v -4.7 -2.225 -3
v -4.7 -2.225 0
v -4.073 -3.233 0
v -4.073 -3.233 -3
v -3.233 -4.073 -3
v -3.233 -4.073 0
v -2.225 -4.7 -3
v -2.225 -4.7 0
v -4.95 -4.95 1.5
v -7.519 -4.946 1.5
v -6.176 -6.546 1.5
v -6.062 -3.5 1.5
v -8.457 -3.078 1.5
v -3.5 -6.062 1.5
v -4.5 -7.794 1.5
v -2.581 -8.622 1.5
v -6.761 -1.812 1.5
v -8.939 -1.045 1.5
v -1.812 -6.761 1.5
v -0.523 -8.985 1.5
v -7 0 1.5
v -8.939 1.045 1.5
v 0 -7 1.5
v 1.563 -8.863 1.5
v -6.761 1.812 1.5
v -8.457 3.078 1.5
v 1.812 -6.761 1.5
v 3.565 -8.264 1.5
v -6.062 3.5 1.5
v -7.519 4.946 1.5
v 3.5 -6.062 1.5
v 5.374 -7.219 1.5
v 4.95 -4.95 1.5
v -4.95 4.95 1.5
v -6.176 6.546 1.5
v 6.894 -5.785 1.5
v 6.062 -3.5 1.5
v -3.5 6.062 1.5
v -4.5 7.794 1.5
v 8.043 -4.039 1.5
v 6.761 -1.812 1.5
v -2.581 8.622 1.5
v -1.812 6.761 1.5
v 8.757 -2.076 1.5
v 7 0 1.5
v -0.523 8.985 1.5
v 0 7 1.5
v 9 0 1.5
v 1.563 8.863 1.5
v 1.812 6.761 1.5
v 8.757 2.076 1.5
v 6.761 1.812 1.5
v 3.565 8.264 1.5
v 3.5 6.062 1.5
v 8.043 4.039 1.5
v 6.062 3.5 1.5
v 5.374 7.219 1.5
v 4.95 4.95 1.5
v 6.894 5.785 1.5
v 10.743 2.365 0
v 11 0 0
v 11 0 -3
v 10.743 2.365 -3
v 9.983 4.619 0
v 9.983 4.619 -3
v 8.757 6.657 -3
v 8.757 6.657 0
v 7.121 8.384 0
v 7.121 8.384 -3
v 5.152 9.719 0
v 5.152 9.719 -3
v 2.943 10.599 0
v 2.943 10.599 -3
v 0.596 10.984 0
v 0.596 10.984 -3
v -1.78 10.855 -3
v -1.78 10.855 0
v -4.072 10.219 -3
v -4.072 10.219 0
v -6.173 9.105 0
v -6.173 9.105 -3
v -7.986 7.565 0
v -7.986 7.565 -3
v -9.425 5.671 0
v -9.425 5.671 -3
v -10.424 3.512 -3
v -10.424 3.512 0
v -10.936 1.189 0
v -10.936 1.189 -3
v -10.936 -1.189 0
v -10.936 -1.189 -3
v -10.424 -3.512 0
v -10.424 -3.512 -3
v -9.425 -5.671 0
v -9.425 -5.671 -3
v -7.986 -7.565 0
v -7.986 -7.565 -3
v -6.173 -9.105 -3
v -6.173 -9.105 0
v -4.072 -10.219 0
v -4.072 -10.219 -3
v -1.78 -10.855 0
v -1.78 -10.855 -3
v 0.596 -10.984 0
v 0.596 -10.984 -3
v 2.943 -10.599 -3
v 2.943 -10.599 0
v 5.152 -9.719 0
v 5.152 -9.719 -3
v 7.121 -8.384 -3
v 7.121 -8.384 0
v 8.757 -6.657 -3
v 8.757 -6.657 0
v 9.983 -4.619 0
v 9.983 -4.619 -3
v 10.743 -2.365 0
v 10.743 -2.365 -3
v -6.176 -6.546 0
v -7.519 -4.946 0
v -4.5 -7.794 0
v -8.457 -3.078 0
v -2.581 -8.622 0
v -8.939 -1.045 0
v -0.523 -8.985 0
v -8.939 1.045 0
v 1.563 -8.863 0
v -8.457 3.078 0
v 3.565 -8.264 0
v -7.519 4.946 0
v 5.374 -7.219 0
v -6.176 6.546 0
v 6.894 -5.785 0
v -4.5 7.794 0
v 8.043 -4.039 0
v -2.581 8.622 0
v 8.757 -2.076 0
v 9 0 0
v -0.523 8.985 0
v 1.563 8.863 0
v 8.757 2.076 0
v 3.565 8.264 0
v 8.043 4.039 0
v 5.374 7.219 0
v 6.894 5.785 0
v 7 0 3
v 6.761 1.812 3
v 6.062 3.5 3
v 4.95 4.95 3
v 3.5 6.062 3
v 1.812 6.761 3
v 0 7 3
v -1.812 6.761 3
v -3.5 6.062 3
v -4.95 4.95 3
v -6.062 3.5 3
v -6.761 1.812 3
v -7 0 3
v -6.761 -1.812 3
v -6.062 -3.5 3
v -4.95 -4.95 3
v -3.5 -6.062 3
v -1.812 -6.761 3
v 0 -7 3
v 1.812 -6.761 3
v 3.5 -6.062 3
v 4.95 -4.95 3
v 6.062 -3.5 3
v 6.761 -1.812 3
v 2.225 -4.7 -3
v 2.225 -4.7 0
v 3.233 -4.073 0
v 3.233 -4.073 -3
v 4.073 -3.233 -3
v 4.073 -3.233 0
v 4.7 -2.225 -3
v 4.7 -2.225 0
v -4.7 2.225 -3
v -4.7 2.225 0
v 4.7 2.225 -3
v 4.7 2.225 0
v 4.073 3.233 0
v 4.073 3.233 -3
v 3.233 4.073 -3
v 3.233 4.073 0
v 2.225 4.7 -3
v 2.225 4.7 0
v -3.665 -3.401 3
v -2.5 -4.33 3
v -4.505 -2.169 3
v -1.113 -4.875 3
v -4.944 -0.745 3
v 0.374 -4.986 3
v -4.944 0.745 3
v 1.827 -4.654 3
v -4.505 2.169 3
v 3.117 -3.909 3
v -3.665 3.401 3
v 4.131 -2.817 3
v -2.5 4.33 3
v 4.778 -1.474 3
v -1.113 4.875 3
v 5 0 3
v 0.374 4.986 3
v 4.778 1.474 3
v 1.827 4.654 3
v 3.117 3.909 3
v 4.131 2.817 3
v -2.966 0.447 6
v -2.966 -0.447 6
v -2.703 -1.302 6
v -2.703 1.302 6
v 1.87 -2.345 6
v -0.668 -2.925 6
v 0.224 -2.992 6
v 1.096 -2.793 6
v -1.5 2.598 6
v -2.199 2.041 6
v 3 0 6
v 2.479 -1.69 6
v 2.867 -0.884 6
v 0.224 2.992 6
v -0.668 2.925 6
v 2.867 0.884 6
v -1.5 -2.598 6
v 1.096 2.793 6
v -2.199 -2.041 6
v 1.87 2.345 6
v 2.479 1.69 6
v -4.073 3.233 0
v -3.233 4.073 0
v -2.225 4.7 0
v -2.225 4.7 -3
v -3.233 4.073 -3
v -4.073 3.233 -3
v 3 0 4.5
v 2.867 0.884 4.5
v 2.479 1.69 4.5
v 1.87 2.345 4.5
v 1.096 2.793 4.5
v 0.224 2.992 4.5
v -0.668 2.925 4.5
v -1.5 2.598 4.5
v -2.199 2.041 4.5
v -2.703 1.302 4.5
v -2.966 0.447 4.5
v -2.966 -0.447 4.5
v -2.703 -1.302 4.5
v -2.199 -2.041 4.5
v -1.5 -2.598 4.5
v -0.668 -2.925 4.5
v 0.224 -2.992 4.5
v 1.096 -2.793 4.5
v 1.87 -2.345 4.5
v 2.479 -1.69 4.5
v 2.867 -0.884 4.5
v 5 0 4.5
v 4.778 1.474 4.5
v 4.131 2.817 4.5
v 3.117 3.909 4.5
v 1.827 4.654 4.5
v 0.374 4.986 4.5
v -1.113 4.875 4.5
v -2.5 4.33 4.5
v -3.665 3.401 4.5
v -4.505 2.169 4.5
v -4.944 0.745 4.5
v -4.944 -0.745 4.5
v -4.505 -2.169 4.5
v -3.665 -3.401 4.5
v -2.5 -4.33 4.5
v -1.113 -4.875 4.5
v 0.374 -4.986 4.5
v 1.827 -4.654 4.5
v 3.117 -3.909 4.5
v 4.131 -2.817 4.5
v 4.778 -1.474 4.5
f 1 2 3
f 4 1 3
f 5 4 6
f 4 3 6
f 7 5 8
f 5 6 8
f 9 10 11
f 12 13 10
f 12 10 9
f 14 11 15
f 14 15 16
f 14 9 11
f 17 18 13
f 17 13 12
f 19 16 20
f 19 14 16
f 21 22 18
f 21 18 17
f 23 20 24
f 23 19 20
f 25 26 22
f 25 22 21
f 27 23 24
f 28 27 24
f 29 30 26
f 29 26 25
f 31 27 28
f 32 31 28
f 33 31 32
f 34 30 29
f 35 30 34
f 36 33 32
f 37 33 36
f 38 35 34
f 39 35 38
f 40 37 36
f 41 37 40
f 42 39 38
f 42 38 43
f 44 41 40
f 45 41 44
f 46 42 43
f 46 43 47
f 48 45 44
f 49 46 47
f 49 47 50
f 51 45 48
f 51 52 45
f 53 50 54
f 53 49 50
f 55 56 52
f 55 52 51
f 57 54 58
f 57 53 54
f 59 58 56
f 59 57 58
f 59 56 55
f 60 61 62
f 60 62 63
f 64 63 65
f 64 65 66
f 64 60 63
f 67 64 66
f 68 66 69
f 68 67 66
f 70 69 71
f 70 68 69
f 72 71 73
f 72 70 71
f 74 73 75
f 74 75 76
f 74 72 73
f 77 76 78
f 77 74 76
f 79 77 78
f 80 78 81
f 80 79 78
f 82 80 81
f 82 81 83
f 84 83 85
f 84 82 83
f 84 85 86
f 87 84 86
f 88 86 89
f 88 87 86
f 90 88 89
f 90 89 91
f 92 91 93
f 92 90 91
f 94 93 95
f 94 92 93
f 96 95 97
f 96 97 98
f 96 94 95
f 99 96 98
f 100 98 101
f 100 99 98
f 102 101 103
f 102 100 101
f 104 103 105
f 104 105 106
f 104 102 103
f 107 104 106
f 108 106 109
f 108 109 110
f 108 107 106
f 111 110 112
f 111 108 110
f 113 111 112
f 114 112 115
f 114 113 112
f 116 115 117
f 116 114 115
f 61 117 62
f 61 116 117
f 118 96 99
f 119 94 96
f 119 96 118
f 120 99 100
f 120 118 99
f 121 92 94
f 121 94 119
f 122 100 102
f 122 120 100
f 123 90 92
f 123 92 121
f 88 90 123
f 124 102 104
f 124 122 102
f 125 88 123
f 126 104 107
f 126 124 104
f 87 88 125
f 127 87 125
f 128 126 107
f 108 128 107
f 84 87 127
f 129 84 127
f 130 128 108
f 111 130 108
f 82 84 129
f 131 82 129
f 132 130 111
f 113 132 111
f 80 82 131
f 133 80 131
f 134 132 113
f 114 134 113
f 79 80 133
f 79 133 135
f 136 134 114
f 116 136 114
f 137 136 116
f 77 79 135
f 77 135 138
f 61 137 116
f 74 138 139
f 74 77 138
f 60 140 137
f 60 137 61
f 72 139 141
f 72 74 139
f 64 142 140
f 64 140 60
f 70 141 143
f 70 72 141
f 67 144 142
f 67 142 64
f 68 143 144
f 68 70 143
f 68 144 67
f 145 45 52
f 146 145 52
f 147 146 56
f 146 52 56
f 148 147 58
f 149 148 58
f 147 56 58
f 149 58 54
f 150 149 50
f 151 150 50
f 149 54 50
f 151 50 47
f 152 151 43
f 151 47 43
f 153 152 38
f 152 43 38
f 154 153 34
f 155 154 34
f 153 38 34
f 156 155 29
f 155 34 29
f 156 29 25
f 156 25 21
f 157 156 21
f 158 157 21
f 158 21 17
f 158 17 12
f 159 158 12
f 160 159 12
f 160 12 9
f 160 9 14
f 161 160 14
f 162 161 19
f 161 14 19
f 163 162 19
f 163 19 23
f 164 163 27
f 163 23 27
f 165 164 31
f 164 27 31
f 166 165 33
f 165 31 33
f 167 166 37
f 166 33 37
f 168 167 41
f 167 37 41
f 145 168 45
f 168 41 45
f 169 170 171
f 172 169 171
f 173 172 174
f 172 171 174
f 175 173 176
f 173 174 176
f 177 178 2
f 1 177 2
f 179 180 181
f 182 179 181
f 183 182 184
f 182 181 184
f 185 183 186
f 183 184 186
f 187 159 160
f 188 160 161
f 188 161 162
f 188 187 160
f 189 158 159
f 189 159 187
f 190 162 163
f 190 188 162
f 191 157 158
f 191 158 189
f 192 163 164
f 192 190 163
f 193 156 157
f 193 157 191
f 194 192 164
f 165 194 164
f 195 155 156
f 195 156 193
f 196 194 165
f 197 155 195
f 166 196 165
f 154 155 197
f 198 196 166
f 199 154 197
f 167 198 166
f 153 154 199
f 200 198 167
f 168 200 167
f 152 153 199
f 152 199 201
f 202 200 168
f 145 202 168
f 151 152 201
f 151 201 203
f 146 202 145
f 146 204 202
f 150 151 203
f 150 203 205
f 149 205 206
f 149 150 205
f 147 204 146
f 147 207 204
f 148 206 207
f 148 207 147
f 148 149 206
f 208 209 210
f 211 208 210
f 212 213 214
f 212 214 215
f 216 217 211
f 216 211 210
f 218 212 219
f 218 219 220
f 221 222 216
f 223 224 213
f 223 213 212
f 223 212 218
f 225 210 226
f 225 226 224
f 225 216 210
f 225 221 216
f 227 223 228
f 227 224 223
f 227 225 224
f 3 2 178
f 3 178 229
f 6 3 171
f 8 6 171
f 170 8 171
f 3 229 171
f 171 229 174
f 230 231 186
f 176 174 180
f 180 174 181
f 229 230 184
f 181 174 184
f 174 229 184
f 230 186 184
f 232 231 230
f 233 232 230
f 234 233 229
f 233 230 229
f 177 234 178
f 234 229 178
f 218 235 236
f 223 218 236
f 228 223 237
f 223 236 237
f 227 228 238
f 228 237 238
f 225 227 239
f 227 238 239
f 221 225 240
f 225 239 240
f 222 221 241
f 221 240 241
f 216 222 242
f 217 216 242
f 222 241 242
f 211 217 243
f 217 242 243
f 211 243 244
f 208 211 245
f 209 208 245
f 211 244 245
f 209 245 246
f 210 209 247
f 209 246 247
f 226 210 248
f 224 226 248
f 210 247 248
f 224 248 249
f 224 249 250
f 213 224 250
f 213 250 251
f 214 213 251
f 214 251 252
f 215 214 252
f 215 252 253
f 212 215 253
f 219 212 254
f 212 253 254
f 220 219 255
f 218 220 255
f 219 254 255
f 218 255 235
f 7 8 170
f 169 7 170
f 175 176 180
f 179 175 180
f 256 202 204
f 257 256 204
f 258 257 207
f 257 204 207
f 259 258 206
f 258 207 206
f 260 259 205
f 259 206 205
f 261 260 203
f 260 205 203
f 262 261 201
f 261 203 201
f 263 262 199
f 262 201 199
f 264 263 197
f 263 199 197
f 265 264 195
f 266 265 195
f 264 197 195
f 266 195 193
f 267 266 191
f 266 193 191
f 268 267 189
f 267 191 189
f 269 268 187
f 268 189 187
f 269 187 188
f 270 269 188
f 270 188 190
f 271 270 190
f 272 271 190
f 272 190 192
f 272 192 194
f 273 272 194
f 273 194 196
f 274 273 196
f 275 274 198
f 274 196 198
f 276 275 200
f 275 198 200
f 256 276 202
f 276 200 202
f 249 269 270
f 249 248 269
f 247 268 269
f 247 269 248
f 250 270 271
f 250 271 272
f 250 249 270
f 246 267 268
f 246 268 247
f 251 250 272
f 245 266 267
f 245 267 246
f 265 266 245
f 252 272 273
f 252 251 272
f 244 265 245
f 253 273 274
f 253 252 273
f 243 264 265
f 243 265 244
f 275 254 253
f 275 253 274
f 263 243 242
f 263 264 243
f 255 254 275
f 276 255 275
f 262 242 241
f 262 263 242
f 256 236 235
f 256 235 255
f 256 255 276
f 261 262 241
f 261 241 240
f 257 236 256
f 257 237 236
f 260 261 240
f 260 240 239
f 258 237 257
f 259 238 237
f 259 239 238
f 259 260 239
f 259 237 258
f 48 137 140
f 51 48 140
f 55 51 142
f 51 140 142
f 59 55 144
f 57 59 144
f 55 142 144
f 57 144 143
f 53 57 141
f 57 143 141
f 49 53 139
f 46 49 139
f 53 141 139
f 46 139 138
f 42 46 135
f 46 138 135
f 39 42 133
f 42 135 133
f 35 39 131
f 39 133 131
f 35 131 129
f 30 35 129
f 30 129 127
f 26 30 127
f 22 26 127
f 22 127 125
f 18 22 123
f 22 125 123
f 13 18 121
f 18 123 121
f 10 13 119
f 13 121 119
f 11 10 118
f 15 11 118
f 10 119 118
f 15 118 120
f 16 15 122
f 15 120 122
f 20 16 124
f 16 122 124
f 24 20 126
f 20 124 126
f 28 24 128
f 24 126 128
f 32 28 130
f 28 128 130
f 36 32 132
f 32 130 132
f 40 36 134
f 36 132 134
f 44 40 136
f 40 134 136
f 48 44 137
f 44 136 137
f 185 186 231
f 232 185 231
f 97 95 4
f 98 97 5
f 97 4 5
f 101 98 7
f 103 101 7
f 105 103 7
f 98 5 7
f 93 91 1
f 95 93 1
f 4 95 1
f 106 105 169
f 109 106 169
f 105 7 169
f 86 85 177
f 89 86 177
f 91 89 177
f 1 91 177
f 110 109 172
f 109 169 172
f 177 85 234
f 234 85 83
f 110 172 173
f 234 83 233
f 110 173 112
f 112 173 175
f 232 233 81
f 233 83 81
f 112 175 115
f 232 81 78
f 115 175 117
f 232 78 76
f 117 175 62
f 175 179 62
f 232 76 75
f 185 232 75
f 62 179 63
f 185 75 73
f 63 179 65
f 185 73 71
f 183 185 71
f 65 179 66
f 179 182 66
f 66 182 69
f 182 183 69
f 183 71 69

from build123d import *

# Parameters (mm, degrees)
SKETCH1_R      = 11
EXTRUDE1_DEPTH = 3
SKETCH2_R      = 9
EXTRUDE2_DEPTH = 1.5
SKETCH3_R      = 7
EXTRUDE3_DEPTH = 1.5
SKETCH4_R      = 5
EXTRUDE4_DEPTH = 1.5
SKETCH5_R      = 3
EXTRUDE5_DEPTH = 1.5


with BuildPart() as part:
    # Sketch1 → Extrude1 (new body)
    with BuildSketch(Plane.XY):
        Circle(SKETCH1_R)
        with BuildLine():
            Line((2.224859546, 4.7), (-2.224859546, 4.7))
            ThreePointArc((-2.224859546, 4.7), (-3.676955262, 3.676955262), (-4.7, 2.224859546))
            Line((-4.7, 2.224859546), (-4.7, -2.224859546))
            ThreePointArc((-4.7, -2.224859546), (-3.676955262, -3.676955262), (-2.224859546, -4.7))
            Line((-2.224859546, -4.7), (2.224859546, -4.7))
            ThreePointArc((2.224859546, -4.7), (3.676955262, -3.676955262), (4.7, -2.224859546))
            Line((4.7, -2.224859546), (4.7, 2.224859546))
            ThreePointArc((4.7, 2.224859546), (3.676955262, 3.676955262), (2.224859546, 4.7))
        make_face(mode=Mode.SUBTRACT)
    extrude(amount=-EXTRUDE1_DEPTH)

    # Sketch2 → Extrude2 (add)
    with BuildSketch(Plane.XY):
        Circle(SKETCH2_R)
    extrude(amount=EXTRUDE2_DEPTH)

    # Sketch3 → Extrude3 (add)
    with BuildSketch(Plane.XY.offset(1.5)):
        Circle(SKETCH3_R)
    extrude(amount=EXTRUDE3_DEPTH)

    # Sketch4 → Extrude4 (add)
    with BuildSketch(Plane.XY.offset(3)):
        Circle(SKETCH4_R)
    extrude(amount=EXTRUDE4_DEPTH)

    # Sketch5 → Extrude5 (add)
    with BuildSketch(Plane.XY.offset(4.5)):
        Circle(SKETCH5_R)
    extrude(amount=EXTRUDE5_DEPTH)


solid = part.part
